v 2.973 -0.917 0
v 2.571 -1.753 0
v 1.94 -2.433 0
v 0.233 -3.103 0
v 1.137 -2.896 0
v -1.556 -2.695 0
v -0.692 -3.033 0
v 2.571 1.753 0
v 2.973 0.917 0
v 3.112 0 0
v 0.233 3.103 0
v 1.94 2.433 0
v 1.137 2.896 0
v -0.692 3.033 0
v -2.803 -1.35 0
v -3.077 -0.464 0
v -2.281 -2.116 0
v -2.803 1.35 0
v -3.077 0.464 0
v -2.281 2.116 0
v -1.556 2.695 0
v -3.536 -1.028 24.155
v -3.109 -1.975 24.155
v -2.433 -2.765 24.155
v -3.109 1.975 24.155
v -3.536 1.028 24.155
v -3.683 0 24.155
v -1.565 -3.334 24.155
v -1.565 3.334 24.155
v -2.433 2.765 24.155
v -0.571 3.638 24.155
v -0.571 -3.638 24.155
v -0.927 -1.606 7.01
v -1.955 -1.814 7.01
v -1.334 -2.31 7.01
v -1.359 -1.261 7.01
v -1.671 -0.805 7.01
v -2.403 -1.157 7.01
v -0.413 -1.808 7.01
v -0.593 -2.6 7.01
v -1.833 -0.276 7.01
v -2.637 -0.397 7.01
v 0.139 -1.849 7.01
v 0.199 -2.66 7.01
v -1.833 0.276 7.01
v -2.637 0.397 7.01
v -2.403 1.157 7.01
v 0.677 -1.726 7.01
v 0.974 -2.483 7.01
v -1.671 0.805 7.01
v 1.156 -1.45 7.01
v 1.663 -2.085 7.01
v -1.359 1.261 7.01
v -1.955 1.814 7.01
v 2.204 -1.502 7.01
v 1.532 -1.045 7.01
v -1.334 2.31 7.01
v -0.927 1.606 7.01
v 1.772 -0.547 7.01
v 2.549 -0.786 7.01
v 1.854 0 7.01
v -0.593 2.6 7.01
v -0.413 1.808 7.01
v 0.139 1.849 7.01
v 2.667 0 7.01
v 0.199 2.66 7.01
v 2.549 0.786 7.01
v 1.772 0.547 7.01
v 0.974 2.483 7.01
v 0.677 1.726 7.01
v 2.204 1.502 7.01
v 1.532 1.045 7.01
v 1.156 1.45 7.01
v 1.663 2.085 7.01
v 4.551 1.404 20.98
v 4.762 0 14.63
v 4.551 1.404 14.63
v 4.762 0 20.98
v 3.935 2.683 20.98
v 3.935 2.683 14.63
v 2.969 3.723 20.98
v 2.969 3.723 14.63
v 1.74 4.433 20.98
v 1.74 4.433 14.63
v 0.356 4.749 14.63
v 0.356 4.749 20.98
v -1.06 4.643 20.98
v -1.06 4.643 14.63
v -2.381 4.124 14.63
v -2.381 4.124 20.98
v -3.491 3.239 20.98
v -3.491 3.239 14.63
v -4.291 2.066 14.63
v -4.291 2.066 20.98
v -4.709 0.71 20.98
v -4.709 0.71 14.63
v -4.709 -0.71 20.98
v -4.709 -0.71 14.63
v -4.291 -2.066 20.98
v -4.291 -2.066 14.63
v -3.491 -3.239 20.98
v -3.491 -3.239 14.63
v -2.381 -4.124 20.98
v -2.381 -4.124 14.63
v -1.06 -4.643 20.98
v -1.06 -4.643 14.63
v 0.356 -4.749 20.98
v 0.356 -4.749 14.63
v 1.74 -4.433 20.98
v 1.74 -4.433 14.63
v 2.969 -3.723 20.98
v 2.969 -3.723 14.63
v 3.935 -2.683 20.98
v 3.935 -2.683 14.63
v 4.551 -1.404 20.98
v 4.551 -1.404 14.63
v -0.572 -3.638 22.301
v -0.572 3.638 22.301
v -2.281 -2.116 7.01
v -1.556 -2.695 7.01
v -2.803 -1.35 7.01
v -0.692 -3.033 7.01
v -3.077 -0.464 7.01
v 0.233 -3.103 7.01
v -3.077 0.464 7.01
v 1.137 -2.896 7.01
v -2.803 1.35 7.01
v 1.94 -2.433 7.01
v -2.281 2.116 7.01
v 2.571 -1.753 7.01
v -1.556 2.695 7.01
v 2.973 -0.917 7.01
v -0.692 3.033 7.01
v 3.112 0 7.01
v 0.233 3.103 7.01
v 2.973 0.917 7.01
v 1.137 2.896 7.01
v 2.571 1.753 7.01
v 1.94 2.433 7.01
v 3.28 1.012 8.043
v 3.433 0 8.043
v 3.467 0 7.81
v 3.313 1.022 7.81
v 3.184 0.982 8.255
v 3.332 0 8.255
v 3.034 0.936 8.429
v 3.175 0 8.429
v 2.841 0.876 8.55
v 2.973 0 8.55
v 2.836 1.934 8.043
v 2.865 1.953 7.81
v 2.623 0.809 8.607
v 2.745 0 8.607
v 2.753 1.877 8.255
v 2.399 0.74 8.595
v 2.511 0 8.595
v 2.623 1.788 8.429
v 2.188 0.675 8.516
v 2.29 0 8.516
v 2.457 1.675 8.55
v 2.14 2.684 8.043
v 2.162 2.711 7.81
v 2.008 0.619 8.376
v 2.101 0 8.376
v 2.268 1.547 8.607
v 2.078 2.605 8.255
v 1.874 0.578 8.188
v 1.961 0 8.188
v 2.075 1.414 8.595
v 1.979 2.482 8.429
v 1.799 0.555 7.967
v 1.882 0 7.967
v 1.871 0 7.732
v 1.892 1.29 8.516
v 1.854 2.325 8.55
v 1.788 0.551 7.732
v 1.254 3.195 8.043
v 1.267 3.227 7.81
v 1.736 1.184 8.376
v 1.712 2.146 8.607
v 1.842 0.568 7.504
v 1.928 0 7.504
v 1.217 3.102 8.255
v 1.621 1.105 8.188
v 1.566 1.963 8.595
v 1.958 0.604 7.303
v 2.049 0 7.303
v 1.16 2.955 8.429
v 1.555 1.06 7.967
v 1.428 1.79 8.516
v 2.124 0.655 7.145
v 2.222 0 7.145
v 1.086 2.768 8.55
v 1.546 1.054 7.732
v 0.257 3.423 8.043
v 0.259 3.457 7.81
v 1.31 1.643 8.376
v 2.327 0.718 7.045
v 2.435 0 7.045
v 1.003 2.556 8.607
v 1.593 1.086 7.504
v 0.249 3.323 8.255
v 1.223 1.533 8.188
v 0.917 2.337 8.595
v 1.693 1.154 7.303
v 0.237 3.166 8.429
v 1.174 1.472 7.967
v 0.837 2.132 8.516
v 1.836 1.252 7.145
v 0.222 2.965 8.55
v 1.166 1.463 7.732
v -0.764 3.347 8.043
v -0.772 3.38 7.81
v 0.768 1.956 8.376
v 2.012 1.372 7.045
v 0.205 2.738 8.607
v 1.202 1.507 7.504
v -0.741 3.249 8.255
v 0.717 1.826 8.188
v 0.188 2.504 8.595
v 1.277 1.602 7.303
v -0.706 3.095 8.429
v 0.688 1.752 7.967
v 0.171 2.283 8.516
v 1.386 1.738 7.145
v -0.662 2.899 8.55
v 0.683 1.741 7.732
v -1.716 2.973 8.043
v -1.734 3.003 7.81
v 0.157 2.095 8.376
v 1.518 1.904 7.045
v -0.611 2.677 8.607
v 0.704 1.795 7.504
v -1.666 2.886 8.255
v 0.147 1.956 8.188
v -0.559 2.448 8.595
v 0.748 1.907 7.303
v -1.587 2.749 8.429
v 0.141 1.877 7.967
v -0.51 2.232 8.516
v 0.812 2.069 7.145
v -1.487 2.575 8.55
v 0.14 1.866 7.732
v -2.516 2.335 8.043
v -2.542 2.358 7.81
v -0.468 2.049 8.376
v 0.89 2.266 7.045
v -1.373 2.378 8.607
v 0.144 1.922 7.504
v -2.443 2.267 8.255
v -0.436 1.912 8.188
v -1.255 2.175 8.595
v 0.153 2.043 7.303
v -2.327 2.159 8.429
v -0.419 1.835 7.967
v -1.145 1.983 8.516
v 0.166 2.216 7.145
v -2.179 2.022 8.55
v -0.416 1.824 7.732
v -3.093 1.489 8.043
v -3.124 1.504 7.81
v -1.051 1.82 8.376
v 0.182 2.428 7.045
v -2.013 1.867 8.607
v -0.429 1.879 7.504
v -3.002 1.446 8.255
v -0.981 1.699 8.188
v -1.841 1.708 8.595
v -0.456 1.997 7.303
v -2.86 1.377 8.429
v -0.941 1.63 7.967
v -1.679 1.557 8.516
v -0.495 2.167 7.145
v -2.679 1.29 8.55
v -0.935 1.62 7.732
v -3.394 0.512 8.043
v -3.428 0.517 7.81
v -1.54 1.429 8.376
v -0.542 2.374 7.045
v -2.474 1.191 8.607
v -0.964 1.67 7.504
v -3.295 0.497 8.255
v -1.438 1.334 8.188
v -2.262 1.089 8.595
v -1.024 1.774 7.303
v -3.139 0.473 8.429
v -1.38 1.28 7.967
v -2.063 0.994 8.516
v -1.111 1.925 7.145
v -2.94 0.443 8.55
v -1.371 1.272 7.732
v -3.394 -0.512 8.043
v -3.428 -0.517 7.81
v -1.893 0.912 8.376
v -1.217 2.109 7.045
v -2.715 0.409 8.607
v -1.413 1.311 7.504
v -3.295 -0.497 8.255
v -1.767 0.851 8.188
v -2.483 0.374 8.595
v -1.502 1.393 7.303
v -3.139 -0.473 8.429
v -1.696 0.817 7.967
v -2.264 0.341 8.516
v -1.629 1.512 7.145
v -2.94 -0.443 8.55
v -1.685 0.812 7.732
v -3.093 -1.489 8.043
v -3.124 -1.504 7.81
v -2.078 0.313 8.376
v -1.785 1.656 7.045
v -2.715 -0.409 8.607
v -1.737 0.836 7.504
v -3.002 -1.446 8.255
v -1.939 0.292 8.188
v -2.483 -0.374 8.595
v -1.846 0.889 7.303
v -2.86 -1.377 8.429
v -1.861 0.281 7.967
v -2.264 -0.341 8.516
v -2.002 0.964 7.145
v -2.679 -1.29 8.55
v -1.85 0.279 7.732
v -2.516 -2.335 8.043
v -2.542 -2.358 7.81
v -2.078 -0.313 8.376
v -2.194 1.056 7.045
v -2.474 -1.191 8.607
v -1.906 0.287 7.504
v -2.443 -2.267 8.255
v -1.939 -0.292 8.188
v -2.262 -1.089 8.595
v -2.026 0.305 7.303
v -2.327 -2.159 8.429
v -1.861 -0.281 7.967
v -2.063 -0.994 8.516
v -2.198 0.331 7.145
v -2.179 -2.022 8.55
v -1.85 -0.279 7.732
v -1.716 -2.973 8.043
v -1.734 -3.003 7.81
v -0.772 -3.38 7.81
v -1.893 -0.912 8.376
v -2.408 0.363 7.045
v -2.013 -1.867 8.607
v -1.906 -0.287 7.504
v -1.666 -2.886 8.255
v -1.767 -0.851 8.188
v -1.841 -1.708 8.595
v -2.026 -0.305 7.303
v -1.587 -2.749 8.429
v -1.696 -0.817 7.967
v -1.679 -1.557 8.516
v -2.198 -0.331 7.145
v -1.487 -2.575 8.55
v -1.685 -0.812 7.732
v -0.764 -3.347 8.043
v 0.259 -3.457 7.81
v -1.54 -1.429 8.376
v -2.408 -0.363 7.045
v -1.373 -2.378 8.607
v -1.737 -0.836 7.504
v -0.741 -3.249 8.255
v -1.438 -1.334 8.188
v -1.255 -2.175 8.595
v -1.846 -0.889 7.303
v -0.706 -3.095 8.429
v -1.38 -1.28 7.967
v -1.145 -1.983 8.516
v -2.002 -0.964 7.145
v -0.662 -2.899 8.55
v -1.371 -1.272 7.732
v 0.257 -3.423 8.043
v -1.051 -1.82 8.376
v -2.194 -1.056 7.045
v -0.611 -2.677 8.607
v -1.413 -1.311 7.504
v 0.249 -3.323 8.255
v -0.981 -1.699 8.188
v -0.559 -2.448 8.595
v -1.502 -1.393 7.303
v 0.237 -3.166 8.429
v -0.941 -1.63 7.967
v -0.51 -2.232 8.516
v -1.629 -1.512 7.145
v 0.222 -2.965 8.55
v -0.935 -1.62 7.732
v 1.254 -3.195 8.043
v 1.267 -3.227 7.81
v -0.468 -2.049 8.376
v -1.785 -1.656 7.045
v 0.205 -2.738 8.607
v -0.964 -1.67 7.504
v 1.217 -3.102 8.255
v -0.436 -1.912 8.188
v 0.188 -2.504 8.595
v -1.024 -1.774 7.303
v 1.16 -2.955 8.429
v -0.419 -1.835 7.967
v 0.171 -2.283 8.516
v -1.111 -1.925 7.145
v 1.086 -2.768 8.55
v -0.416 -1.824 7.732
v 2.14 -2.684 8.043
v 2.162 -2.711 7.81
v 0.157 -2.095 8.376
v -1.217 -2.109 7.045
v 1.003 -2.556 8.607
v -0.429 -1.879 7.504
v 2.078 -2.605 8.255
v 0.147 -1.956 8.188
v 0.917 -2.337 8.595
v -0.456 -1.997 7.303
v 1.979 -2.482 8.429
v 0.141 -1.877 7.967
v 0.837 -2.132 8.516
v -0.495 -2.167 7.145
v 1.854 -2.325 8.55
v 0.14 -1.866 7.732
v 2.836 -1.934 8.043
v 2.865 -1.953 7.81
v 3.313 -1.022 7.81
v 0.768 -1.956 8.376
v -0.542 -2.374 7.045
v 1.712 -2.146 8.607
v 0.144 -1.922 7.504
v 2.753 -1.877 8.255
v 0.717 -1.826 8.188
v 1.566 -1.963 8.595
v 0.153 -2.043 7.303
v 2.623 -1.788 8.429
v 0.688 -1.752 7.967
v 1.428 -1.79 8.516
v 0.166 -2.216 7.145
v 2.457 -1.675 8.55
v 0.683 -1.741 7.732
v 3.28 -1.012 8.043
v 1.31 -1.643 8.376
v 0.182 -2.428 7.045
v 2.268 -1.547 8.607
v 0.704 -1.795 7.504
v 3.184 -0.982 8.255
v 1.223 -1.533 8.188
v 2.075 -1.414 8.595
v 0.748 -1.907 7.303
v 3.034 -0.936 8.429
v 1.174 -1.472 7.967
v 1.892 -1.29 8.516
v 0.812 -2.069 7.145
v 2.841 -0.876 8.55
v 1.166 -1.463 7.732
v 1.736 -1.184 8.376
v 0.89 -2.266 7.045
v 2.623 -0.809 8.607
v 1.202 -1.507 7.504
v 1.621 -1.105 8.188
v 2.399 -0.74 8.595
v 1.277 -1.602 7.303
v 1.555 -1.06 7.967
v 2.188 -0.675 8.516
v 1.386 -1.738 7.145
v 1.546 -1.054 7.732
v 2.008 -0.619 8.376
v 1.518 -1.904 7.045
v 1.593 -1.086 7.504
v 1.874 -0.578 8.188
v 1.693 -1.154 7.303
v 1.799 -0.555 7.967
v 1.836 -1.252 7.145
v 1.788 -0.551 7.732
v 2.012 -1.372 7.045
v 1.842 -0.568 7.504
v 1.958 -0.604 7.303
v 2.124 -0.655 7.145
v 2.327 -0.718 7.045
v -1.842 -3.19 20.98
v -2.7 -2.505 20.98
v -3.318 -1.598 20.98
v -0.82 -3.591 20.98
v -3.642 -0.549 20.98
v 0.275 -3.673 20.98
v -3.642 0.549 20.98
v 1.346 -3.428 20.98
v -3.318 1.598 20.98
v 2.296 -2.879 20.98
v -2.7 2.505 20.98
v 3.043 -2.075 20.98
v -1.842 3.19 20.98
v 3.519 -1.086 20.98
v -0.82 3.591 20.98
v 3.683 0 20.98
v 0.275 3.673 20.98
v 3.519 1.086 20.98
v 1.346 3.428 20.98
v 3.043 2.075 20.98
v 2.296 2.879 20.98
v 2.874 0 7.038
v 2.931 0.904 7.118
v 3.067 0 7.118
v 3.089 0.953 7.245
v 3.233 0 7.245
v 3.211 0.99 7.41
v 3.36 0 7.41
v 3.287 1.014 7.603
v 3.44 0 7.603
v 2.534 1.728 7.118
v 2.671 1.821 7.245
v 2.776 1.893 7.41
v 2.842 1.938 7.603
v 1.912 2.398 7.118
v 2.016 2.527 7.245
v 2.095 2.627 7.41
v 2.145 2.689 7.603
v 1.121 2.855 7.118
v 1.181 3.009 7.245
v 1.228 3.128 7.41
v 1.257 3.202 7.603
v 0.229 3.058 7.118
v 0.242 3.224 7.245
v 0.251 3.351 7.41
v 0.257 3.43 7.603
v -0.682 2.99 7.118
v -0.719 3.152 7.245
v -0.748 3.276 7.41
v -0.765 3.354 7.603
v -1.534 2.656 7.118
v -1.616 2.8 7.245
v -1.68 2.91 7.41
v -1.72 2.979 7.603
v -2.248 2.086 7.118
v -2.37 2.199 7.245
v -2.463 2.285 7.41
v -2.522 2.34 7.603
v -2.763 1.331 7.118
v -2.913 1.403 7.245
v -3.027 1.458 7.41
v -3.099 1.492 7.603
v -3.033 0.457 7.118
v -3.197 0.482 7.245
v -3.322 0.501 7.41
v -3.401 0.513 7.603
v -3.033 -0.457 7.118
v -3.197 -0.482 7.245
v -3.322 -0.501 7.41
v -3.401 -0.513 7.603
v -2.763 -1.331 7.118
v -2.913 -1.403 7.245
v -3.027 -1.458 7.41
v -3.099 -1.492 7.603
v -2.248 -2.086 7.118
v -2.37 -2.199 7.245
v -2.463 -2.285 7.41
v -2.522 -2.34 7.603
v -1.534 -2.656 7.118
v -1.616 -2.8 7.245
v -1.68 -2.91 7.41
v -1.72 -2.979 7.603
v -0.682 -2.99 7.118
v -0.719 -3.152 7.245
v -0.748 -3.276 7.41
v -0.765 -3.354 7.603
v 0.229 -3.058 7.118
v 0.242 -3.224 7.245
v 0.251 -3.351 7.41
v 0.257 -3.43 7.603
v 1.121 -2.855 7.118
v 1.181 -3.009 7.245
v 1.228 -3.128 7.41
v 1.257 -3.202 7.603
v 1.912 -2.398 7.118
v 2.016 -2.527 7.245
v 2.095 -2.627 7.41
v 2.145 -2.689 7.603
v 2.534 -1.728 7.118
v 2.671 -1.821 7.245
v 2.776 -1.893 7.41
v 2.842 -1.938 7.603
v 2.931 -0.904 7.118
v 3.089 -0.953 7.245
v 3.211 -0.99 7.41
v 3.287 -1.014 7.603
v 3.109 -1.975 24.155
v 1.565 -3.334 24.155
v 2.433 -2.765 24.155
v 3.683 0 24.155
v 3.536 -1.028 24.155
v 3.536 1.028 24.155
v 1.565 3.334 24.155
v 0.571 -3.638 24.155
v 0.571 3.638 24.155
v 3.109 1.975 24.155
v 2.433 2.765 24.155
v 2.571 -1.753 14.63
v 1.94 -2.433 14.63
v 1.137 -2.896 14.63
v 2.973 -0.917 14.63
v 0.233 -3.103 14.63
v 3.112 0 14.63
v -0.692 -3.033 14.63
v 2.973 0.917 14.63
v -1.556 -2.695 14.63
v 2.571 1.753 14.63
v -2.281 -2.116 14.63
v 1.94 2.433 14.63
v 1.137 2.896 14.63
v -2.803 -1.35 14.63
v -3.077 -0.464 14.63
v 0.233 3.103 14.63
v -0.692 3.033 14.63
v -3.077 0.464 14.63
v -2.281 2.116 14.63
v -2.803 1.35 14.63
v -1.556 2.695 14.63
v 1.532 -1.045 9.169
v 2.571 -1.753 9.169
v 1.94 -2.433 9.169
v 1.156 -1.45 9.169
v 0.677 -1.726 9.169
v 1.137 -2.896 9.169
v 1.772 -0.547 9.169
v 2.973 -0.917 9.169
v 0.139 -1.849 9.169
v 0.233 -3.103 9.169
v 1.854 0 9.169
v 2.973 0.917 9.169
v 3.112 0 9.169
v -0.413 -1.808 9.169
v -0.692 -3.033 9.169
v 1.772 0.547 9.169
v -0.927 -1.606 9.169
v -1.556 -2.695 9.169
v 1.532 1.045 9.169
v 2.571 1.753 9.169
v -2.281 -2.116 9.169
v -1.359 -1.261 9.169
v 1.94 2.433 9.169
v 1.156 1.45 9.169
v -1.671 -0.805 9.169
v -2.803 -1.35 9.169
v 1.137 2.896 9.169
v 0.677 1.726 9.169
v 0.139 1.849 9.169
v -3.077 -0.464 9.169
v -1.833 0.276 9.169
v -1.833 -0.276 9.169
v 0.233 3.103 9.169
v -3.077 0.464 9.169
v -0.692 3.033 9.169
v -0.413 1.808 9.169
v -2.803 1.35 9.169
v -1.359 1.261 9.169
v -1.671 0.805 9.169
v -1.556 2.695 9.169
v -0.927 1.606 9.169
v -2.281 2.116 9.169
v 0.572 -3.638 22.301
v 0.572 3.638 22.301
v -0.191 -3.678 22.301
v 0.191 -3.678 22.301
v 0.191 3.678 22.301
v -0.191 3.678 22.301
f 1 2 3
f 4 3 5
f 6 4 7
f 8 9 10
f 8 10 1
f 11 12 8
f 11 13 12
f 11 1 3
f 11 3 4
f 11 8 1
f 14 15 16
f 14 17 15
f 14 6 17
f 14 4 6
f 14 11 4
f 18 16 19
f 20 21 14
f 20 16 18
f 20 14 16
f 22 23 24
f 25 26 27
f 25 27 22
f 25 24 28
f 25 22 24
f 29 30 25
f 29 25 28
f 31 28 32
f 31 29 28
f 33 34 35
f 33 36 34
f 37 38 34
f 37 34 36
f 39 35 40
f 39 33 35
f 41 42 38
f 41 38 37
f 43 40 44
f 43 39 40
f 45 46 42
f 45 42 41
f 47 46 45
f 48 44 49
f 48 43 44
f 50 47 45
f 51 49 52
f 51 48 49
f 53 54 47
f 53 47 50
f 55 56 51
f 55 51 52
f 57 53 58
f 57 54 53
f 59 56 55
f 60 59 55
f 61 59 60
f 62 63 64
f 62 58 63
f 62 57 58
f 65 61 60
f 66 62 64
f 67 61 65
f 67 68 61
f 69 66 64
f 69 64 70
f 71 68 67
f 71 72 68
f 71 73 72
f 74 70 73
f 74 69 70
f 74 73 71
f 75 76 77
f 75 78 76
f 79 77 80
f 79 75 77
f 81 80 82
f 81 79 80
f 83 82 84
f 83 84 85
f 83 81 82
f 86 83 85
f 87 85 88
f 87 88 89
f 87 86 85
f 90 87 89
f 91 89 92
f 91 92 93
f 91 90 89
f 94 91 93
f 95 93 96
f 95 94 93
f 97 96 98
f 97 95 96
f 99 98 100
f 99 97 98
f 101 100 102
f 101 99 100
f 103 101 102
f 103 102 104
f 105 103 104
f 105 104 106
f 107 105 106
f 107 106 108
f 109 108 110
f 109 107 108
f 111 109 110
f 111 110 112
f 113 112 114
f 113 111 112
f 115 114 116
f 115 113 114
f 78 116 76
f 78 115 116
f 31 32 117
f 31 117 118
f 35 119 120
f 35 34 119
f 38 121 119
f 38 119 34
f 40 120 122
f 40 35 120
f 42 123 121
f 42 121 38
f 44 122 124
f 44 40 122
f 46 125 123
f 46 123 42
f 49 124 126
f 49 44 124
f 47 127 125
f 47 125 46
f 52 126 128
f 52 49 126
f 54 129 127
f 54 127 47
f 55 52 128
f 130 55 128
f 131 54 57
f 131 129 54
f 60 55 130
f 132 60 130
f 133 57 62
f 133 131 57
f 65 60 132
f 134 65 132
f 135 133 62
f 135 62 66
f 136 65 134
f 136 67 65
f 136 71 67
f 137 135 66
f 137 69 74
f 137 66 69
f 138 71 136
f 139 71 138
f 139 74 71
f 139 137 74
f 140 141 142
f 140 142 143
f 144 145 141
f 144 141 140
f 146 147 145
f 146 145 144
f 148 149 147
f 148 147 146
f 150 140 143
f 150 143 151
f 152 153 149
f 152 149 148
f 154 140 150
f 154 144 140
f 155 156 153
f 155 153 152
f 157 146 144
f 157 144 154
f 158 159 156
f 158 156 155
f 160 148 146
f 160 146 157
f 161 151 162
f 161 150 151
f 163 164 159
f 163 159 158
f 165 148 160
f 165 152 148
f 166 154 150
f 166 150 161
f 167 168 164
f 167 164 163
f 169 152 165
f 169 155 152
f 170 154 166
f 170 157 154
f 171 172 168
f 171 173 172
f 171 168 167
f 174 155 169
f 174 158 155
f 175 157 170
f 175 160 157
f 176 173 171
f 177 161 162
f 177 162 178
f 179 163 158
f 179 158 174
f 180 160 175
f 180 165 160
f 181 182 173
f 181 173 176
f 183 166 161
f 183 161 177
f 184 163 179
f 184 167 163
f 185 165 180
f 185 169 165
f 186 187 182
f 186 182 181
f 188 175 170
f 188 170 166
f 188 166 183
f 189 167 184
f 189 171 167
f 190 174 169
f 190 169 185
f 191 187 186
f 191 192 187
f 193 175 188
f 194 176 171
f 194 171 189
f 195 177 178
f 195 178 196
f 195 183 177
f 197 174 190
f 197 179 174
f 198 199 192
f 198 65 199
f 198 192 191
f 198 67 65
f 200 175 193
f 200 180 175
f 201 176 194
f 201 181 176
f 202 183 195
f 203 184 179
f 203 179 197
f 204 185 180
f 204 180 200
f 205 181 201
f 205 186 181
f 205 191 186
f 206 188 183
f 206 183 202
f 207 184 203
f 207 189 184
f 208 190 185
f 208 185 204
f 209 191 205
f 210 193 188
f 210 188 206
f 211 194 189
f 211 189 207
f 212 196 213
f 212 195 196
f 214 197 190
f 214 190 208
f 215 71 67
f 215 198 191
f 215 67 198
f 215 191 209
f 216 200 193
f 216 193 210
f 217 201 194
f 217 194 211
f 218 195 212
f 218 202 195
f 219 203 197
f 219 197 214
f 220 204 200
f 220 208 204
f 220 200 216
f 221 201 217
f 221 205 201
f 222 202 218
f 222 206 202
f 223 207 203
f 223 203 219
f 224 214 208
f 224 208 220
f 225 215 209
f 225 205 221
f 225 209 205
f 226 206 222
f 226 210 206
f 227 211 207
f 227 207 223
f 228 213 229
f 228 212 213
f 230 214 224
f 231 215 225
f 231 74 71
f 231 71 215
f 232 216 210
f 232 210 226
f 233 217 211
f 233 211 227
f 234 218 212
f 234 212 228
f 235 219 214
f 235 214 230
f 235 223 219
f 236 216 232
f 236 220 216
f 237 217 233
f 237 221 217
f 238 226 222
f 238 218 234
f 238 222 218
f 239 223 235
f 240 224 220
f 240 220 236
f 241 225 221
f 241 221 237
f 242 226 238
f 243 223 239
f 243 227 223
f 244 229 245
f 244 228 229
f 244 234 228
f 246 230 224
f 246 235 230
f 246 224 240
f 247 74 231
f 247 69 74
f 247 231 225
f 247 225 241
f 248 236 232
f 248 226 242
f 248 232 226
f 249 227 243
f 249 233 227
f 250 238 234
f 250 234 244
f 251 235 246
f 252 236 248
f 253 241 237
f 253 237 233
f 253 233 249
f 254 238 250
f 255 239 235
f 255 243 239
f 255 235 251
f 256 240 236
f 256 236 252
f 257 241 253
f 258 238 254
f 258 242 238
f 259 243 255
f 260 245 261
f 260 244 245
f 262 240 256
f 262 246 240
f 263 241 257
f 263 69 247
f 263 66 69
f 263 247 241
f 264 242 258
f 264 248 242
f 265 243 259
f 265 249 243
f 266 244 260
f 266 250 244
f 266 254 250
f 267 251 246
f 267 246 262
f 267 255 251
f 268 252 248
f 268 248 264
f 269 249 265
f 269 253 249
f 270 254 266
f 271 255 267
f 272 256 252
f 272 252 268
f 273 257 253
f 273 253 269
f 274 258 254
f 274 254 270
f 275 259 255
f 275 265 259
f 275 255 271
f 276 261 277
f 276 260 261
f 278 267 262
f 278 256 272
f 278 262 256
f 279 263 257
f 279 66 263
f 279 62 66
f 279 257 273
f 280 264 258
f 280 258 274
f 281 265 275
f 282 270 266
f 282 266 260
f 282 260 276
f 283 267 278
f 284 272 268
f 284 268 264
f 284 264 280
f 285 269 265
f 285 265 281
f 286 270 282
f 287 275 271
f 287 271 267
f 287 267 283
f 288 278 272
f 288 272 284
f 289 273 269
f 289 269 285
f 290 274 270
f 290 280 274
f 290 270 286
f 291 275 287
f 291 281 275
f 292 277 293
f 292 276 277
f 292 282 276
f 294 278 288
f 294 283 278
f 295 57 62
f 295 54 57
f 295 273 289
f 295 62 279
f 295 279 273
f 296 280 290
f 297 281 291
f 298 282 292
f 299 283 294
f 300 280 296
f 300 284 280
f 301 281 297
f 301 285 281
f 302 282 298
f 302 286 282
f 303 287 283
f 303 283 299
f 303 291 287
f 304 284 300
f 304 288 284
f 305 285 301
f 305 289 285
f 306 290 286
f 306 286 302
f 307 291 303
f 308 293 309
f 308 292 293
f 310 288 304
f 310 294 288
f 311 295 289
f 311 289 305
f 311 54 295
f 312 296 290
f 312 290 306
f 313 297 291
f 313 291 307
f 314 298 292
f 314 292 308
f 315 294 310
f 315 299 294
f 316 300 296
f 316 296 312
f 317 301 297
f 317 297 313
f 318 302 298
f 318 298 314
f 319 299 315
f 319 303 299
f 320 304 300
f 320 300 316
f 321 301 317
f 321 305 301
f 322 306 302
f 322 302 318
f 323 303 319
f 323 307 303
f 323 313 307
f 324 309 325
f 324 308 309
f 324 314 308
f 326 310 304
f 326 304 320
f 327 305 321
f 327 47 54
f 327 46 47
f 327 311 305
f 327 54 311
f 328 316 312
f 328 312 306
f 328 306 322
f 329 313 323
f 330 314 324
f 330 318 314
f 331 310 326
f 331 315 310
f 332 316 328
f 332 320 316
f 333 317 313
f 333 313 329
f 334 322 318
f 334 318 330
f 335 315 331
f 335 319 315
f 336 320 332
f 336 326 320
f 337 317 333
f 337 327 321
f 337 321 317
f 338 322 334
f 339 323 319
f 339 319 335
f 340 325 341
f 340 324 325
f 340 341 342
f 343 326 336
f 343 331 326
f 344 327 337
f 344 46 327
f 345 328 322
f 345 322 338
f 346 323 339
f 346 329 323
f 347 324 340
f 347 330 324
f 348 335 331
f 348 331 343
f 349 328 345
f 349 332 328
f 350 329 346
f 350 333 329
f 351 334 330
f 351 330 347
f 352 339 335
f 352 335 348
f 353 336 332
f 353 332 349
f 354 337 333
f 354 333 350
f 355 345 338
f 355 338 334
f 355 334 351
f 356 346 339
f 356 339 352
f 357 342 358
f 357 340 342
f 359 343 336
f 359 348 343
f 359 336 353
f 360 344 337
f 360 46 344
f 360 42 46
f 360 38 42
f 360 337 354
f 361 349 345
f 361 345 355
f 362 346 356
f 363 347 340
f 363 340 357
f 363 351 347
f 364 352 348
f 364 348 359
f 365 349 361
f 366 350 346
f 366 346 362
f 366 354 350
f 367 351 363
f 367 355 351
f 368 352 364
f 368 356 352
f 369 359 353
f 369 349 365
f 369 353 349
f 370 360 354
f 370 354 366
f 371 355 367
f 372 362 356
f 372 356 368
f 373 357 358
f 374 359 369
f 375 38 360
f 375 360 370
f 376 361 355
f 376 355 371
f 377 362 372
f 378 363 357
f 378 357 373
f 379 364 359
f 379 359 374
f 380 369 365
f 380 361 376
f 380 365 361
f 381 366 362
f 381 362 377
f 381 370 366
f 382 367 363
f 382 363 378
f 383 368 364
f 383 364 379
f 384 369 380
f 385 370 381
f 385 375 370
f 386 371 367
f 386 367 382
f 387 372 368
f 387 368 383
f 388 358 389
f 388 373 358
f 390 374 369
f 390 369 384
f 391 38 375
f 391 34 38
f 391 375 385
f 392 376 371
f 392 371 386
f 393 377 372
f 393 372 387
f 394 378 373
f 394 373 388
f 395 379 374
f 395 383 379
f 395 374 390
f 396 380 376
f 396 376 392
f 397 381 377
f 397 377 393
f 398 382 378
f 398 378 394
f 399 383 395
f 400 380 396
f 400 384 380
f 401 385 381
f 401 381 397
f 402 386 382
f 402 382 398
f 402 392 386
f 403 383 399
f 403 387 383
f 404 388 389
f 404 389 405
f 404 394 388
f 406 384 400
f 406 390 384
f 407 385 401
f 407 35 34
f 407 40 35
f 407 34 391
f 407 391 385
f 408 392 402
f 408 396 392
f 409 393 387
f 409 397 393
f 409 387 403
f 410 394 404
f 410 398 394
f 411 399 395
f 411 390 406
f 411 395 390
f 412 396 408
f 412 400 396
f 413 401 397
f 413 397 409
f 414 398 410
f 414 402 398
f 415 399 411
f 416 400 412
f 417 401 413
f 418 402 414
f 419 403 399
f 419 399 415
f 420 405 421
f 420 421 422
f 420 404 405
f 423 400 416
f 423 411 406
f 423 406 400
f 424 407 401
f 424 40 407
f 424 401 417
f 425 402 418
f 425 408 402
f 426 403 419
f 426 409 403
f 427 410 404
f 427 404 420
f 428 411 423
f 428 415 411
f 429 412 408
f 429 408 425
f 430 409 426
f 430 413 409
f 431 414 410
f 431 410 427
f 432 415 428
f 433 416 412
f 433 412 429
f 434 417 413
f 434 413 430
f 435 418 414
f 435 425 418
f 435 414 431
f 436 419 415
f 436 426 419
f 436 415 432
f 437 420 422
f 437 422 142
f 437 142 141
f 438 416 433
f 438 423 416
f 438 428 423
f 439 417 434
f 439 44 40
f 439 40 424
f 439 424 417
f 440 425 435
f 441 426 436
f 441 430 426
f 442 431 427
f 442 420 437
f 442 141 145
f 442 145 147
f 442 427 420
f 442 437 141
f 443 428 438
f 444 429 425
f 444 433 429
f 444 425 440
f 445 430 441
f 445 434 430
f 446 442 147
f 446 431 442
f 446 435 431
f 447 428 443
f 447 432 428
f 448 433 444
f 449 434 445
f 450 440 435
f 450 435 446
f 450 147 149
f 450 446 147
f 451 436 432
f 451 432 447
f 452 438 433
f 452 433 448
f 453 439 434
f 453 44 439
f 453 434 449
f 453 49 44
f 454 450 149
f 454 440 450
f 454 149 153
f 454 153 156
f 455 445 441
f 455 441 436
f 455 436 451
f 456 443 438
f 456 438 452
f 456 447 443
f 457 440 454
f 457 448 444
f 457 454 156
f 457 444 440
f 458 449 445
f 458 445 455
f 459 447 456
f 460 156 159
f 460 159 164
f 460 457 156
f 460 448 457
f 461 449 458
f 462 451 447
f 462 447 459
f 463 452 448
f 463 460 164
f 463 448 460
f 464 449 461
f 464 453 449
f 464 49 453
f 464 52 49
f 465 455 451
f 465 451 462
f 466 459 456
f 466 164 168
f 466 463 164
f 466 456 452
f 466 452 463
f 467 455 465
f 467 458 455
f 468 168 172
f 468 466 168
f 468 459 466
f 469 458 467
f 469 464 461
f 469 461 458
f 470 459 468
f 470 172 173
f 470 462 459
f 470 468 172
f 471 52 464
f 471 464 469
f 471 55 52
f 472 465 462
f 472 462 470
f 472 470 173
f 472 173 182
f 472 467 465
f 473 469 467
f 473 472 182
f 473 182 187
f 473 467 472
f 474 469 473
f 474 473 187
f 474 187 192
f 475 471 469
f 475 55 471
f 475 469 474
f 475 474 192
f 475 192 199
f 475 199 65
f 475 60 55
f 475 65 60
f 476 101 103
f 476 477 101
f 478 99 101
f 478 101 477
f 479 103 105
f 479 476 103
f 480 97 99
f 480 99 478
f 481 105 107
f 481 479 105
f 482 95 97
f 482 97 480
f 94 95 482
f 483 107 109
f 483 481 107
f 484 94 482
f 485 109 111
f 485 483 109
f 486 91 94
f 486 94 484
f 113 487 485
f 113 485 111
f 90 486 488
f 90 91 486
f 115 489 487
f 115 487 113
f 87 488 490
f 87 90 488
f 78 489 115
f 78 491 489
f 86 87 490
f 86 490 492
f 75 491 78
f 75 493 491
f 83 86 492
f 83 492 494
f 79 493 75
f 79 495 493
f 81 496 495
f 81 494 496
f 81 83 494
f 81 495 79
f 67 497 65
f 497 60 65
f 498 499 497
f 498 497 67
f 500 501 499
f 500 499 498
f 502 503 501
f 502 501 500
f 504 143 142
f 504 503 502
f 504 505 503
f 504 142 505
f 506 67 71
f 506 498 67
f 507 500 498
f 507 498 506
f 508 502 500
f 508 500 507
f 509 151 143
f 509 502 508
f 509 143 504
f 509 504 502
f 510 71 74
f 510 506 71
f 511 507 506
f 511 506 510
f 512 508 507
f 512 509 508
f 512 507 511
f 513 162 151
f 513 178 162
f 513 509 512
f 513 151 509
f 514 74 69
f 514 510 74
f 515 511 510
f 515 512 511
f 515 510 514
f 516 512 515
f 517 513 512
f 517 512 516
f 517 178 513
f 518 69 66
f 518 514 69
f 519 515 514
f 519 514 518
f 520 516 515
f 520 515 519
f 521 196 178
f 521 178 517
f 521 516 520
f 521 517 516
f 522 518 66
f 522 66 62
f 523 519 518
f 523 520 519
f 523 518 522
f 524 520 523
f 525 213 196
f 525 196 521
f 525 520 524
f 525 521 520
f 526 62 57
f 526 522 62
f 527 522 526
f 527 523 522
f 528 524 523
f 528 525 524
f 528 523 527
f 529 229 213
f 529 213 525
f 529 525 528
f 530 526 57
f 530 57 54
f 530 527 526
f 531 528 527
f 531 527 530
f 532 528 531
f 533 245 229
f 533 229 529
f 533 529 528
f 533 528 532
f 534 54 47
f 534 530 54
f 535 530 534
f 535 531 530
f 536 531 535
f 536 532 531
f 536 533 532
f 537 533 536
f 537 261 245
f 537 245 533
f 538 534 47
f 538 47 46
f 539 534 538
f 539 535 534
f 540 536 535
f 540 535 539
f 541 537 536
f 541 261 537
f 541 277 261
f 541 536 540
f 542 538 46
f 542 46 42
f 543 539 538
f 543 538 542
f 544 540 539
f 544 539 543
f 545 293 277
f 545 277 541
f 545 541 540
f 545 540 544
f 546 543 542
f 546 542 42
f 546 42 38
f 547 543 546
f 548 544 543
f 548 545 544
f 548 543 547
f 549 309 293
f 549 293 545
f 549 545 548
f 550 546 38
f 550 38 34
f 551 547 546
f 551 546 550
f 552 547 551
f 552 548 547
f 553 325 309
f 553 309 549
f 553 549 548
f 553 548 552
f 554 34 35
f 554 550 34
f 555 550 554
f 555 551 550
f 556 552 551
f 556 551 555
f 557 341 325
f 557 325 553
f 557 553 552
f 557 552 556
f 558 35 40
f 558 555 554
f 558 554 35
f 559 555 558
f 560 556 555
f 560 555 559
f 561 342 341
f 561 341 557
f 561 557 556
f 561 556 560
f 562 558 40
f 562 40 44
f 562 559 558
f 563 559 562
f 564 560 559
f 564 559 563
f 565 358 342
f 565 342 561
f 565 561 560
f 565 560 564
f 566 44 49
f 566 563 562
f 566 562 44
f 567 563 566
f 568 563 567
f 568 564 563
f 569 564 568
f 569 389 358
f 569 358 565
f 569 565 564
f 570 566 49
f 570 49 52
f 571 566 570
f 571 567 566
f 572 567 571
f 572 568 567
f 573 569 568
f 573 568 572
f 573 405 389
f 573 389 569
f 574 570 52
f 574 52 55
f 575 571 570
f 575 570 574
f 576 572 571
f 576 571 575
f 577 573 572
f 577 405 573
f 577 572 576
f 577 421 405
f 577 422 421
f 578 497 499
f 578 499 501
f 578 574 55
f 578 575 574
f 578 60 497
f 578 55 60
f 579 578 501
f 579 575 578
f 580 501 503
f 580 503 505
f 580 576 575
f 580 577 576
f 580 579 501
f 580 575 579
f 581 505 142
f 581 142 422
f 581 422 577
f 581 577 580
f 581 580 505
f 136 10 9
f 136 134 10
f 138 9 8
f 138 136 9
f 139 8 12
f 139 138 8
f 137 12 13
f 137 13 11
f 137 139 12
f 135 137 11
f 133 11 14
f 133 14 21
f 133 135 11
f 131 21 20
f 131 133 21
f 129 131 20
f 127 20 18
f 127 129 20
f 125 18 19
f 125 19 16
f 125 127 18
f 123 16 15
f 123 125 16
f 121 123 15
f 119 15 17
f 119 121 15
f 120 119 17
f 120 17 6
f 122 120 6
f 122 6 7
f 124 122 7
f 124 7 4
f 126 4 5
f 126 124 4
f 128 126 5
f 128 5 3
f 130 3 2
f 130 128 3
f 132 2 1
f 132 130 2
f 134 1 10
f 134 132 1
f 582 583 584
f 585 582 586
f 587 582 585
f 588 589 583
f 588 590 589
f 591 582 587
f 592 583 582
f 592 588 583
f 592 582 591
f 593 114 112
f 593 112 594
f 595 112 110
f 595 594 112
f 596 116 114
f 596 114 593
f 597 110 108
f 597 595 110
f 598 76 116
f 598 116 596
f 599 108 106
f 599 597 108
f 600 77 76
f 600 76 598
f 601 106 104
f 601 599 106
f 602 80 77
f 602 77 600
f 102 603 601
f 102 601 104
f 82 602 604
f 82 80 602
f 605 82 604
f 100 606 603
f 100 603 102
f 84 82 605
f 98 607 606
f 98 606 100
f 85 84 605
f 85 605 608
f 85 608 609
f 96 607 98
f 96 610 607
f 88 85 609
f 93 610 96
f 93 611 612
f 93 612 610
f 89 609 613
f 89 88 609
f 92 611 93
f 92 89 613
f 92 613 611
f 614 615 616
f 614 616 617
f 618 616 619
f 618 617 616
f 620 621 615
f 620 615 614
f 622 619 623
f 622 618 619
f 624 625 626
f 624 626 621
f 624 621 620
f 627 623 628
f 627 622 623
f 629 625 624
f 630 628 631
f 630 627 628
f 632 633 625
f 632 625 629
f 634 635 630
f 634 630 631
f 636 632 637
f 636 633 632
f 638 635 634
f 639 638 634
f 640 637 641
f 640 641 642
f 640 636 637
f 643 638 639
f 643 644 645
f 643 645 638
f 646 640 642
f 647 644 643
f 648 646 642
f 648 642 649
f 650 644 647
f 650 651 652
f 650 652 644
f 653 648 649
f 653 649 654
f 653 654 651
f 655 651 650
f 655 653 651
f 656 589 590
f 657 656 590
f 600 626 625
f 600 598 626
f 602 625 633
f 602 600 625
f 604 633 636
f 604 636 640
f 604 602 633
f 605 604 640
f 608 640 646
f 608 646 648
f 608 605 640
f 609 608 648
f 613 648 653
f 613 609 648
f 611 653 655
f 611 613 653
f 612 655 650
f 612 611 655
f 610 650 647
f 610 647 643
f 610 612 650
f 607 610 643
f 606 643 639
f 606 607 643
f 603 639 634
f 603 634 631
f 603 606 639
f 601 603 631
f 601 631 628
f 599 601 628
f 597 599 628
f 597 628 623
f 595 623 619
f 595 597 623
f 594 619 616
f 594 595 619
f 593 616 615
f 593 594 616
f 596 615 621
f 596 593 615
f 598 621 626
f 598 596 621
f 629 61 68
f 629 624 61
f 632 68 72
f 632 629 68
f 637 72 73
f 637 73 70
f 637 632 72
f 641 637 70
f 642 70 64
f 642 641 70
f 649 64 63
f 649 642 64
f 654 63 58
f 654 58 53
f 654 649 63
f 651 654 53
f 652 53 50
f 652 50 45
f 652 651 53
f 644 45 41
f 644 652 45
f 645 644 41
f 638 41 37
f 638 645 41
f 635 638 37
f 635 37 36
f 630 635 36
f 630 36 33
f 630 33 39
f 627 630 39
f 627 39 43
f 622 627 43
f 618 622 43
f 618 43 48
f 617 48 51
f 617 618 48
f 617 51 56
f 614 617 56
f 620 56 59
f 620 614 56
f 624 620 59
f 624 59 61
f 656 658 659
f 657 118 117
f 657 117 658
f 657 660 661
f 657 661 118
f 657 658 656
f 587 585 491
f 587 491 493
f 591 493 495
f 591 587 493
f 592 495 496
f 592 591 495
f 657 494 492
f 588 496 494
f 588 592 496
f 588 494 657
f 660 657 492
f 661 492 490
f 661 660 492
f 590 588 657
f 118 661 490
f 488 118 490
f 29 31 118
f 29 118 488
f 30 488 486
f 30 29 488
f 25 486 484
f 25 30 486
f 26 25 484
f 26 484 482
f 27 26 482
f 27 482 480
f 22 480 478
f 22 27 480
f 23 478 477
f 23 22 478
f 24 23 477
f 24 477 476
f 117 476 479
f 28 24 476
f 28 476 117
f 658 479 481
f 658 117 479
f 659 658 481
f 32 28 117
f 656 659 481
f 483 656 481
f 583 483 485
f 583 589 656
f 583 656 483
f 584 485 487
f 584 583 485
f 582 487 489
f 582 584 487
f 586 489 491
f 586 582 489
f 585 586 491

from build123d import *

# Parameters (mm, degrees)
F2_W     = 1.143
F2_H     = 9.525
F3_DEPTH = 1.8542
F4_R     = 0.8001


with BuildPart() as f1:
    # F0 (on Front) → F1 (revolve)
    with BuildSketch(Plane.XZ):
        Polygon((0, 24.1554), (0, 0), (3.1115, 0), (3.1115, 7.0104), (1.8542, 7.0104), (1.8542, 9.1694), (3.1115, 9.1694), (3.1115, 14.6304), (4.7625, 14.6304), (4.7625, 20.9804), (3.683, 20.9804), (3.683, 24.1554), align=None)
    revolve(axis=Axis((0, 0, 13.226326), (0, 0, 1)))

    # F2 (on face) → F3 (cut)
    with BuildSketch(Plane.XY.offset(24.1554)):
        Rectangle(F2_W, F2_H)
    extrude(amount=-F3_DEPTH, mode=Mode.SUBTRACT)

    # F4 (on Front) → F5 (revolve)
    with BuildSketch(Plane.XZ):
        with Locations((2.667, 7.8105)):
            Circle(F4_R)
    revolve(axis=Axis((0, 0, 11.601659), (0, 0, 1)))


solid = f1.part
